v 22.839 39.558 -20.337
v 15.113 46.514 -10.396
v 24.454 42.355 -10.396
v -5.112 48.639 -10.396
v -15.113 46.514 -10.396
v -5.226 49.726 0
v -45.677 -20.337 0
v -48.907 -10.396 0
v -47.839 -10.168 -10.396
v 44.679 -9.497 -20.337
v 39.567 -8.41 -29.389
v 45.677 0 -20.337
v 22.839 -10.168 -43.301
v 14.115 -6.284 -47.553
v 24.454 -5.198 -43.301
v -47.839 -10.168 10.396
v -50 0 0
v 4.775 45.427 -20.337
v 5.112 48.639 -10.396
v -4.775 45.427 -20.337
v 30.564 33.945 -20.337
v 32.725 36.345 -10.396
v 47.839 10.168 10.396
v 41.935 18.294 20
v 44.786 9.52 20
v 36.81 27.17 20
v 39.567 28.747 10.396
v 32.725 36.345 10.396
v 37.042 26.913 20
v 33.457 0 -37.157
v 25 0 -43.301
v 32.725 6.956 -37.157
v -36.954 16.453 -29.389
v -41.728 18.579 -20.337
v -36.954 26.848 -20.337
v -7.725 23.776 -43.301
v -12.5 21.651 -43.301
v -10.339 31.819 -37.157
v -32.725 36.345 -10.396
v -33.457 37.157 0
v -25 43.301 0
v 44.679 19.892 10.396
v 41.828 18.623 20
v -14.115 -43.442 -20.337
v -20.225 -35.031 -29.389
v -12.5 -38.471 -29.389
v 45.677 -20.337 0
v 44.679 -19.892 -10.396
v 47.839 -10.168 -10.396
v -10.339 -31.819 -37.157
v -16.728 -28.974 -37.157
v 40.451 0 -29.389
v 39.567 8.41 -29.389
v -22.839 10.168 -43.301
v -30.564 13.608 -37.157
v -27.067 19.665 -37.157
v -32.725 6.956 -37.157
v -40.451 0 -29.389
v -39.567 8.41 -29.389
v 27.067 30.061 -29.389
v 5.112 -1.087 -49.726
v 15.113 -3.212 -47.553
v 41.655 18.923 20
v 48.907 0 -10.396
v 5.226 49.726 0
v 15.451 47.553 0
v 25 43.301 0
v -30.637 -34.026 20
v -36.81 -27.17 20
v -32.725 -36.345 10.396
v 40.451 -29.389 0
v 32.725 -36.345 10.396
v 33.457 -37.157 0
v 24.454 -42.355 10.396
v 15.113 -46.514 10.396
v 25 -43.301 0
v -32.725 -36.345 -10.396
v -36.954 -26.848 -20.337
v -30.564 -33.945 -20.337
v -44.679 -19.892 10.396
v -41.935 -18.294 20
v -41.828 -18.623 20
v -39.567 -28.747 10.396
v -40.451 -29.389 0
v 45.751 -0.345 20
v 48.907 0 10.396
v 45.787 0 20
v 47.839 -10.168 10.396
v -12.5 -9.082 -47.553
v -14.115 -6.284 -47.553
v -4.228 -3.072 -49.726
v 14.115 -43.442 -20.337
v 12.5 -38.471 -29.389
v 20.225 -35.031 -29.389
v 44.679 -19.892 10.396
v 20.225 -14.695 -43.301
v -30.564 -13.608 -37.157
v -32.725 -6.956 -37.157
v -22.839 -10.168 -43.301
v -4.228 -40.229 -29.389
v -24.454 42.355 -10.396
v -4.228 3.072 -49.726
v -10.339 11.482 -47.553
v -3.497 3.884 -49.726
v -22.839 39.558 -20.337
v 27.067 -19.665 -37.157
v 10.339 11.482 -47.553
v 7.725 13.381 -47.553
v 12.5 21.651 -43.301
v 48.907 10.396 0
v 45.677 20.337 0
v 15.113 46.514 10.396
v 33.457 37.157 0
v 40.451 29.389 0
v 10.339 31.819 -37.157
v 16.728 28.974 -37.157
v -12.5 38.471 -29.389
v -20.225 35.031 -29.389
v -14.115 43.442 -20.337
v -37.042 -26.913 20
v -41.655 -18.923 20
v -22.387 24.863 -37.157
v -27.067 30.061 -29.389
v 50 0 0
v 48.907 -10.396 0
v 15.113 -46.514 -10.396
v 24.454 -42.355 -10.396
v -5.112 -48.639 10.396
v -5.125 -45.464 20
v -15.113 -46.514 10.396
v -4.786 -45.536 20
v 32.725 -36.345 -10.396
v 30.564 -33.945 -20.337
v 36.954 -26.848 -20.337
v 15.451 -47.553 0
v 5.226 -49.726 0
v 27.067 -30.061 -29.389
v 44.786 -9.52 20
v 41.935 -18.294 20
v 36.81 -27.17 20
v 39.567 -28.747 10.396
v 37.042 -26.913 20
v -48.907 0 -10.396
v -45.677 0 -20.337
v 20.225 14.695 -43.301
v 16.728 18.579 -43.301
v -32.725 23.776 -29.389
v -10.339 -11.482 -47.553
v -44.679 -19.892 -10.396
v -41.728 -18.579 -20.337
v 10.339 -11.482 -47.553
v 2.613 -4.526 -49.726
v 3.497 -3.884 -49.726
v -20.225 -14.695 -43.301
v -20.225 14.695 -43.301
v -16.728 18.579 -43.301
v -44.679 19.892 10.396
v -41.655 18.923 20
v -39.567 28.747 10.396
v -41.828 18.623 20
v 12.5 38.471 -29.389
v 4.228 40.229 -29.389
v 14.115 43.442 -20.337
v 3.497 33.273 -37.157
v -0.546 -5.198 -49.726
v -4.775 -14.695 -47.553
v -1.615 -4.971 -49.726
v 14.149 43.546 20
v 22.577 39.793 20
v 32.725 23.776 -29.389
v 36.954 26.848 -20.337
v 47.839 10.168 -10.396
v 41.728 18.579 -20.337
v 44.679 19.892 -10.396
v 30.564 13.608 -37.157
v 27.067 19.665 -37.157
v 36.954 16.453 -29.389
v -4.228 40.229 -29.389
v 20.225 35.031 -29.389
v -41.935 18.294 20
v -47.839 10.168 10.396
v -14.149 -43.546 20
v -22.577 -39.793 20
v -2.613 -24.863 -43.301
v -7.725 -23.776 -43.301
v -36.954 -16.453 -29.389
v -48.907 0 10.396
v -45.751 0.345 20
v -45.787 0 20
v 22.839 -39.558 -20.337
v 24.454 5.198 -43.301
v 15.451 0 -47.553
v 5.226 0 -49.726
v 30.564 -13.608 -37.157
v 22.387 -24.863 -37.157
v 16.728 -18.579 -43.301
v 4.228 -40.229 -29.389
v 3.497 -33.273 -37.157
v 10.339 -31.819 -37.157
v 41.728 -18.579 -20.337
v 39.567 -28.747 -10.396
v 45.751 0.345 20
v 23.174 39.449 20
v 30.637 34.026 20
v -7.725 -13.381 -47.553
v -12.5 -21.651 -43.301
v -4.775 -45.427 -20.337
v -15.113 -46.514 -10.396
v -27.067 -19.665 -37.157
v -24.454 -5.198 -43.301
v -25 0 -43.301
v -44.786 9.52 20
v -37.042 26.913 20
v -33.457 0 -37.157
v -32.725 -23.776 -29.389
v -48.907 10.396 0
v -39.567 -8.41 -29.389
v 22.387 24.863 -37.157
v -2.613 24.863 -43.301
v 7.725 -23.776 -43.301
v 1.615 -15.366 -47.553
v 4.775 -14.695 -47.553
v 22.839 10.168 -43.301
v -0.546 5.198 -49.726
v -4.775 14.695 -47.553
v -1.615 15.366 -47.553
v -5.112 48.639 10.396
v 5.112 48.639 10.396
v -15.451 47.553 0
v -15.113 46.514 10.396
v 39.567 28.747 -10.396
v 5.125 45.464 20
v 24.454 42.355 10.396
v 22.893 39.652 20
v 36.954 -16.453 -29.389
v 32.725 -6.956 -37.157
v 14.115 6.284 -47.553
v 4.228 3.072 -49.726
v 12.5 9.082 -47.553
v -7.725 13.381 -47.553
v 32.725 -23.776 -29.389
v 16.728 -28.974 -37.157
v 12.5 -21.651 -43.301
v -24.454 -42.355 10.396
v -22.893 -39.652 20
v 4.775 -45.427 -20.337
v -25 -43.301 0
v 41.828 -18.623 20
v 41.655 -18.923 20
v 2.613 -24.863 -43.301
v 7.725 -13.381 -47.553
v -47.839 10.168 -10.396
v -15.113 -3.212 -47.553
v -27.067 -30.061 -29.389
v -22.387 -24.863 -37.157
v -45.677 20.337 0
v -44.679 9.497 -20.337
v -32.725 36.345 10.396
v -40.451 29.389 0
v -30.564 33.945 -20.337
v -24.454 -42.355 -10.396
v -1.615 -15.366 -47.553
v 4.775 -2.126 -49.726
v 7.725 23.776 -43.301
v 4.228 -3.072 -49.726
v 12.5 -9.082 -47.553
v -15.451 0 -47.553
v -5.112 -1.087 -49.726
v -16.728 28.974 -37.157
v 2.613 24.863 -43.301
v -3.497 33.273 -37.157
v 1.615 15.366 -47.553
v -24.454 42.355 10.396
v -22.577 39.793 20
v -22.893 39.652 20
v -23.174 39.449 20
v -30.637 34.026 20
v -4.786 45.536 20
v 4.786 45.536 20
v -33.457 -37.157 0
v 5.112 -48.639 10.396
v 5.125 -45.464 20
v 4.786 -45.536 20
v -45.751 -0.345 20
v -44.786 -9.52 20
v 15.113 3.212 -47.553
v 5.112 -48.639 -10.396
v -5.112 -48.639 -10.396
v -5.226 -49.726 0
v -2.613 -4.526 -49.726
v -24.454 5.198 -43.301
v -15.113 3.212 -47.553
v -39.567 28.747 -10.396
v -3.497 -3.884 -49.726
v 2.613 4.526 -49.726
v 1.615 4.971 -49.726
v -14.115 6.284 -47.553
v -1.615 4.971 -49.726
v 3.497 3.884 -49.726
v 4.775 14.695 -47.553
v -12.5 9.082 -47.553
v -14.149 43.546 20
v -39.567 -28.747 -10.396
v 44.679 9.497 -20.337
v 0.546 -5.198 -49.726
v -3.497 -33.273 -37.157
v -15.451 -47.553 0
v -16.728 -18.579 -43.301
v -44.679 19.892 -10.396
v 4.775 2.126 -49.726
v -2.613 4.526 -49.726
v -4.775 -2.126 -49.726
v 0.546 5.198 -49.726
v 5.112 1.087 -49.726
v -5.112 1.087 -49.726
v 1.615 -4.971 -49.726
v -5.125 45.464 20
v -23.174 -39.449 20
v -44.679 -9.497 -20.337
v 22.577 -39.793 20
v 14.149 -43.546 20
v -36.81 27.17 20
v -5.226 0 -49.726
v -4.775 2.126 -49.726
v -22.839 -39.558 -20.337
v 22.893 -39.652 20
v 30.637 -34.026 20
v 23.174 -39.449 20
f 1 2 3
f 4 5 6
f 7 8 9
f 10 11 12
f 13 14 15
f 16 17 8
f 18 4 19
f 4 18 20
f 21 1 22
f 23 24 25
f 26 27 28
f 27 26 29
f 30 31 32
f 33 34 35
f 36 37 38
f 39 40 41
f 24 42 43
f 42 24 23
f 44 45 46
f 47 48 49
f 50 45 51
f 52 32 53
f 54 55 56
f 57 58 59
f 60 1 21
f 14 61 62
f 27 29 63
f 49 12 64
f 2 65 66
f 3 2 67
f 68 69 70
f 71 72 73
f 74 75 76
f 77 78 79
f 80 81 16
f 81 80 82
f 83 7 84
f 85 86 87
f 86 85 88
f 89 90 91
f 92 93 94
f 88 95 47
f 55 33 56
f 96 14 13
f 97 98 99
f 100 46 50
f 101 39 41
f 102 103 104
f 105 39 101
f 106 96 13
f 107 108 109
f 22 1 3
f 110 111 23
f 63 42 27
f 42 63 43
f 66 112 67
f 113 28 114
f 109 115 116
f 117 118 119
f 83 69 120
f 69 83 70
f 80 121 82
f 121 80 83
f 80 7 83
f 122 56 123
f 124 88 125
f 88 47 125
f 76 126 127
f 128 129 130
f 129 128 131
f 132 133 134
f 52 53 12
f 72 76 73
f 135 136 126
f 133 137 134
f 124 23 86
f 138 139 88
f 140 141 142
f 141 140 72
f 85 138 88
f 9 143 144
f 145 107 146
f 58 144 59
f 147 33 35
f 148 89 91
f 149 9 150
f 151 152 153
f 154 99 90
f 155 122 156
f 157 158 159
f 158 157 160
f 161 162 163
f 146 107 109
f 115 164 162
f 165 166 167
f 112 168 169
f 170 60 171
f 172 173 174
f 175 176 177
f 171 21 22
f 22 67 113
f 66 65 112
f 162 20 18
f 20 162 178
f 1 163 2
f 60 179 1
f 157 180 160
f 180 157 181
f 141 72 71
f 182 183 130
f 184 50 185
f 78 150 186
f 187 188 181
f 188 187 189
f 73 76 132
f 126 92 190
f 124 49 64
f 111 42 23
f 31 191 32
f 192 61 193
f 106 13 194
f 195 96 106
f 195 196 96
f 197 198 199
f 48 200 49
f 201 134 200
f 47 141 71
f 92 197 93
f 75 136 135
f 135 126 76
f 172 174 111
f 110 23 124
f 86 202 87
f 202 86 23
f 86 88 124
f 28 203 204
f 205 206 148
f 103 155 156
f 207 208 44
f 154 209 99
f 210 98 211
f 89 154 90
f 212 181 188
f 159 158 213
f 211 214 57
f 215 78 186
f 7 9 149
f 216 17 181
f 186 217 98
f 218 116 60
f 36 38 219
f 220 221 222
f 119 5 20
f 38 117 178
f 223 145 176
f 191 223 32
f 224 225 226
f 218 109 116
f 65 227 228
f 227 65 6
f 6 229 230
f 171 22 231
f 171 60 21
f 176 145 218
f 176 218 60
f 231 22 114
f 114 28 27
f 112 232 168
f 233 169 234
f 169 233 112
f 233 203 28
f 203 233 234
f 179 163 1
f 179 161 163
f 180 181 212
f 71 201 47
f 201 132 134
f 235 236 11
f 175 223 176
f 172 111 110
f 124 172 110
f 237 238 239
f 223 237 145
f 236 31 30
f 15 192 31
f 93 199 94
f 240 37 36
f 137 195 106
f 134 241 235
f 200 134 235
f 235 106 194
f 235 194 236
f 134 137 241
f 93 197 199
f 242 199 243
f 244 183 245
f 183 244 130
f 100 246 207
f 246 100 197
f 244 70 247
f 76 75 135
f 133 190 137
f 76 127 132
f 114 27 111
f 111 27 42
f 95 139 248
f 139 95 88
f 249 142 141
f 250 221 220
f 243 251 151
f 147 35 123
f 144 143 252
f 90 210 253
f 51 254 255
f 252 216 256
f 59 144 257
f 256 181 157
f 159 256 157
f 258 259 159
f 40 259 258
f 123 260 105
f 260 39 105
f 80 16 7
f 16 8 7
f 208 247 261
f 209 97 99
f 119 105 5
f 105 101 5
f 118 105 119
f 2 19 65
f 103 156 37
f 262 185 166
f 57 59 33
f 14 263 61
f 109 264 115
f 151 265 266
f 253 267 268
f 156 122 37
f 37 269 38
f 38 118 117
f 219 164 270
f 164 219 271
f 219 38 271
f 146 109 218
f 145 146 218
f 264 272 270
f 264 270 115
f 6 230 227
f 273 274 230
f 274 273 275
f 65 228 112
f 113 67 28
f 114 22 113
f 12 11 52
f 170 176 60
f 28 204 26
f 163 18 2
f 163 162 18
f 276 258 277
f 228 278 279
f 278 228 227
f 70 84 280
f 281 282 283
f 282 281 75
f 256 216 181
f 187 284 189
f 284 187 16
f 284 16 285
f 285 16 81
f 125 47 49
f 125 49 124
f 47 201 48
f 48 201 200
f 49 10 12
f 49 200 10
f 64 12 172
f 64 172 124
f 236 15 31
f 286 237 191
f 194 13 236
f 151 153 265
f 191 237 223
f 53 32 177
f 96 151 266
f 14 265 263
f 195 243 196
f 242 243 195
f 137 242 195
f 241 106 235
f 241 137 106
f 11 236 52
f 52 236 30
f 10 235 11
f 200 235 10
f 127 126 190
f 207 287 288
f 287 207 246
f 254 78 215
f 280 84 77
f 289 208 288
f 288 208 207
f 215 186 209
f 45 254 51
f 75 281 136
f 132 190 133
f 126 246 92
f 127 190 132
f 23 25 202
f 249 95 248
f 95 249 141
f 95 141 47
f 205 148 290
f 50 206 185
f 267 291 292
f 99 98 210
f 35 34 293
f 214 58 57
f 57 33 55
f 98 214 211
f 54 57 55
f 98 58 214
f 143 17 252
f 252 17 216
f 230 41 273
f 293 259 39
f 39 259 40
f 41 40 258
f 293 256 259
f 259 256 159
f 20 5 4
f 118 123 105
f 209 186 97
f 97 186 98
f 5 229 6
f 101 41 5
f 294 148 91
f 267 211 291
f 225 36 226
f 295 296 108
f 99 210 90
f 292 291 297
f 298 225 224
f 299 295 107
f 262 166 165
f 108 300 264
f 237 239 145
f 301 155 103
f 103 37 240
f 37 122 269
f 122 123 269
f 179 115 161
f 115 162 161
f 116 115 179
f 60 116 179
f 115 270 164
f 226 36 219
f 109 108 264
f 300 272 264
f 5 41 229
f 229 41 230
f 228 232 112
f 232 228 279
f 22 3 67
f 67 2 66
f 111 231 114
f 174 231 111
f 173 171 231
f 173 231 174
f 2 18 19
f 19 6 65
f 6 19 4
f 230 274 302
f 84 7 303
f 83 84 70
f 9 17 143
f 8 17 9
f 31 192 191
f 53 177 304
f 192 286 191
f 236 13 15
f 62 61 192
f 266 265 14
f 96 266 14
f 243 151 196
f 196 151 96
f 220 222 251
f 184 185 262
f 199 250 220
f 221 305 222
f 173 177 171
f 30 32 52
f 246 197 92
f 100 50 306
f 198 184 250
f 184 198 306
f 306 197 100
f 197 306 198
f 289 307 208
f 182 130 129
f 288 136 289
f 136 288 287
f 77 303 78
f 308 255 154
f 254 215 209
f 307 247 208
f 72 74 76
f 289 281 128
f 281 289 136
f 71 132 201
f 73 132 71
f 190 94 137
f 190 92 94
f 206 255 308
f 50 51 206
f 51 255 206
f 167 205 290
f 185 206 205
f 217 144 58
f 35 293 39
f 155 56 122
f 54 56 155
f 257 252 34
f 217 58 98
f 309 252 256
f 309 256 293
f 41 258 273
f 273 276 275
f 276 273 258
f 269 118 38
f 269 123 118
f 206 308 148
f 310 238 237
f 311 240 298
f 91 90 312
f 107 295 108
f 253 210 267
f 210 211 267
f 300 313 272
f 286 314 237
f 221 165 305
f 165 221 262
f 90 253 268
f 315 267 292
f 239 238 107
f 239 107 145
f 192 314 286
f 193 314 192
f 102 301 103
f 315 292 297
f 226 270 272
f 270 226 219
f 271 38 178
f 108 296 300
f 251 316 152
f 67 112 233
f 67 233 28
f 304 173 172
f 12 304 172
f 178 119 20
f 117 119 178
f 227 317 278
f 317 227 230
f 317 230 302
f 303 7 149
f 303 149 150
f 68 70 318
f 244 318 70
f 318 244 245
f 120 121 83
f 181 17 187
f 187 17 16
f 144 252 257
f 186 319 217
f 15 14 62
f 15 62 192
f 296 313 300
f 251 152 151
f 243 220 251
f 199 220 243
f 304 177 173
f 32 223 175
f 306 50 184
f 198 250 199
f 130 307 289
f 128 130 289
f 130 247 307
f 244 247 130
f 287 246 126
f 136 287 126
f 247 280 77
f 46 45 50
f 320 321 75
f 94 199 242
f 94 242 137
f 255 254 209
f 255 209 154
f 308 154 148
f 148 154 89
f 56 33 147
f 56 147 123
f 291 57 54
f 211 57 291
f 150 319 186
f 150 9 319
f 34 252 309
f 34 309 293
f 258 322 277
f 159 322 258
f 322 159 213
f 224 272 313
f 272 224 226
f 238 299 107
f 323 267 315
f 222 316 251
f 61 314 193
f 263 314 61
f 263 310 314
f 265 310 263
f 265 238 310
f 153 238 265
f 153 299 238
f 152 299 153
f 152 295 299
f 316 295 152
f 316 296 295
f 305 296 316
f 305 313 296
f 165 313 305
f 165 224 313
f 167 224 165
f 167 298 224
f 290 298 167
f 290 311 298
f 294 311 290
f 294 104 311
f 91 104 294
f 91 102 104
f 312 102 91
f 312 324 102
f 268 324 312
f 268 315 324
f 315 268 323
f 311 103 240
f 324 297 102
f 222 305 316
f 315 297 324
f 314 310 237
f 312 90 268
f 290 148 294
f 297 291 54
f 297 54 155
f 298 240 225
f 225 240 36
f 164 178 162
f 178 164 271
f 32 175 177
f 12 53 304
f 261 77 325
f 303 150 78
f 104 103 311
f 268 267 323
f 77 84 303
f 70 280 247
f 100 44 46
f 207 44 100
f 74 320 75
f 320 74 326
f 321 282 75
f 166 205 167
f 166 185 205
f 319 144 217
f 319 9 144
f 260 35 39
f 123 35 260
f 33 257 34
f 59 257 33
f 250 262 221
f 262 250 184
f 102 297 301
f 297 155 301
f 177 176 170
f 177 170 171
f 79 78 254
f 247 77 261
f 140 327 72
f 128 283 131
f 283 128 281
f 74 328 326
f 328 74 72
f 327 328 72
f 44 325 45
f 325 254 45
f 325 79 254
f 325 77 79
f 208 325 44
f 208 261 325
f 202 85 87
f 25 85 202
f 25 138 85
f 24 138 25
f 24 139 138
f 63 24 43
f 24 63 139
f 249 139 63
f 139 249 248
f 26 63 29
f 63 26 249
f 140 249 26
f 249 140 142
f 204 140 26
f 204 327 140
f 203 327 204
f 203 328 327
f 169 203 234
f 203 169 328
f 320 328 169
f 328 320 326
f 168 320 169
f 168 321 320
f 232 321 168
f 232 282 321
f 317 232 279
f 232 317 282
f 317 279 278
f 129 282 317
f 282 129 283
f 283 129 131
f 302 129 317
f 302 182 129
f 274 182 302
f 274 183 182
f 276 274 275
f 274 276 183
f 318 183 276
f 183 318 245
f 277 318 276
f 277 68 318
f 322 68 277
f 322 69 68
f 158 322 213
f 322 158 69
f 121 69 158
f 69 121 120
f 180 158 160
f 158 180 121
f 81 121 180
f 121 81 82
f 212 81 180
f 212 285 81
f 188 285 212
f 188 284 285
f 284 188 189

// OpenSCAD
module slice_above(height = 0, size = 1000) {
    difference() {
        children();
        translate([-size/2, -size/2, height])
            cube([size, size, size]);
    }
}

// Usage:
slice_above(height = 20) {
    sphere(r = 50);
}
